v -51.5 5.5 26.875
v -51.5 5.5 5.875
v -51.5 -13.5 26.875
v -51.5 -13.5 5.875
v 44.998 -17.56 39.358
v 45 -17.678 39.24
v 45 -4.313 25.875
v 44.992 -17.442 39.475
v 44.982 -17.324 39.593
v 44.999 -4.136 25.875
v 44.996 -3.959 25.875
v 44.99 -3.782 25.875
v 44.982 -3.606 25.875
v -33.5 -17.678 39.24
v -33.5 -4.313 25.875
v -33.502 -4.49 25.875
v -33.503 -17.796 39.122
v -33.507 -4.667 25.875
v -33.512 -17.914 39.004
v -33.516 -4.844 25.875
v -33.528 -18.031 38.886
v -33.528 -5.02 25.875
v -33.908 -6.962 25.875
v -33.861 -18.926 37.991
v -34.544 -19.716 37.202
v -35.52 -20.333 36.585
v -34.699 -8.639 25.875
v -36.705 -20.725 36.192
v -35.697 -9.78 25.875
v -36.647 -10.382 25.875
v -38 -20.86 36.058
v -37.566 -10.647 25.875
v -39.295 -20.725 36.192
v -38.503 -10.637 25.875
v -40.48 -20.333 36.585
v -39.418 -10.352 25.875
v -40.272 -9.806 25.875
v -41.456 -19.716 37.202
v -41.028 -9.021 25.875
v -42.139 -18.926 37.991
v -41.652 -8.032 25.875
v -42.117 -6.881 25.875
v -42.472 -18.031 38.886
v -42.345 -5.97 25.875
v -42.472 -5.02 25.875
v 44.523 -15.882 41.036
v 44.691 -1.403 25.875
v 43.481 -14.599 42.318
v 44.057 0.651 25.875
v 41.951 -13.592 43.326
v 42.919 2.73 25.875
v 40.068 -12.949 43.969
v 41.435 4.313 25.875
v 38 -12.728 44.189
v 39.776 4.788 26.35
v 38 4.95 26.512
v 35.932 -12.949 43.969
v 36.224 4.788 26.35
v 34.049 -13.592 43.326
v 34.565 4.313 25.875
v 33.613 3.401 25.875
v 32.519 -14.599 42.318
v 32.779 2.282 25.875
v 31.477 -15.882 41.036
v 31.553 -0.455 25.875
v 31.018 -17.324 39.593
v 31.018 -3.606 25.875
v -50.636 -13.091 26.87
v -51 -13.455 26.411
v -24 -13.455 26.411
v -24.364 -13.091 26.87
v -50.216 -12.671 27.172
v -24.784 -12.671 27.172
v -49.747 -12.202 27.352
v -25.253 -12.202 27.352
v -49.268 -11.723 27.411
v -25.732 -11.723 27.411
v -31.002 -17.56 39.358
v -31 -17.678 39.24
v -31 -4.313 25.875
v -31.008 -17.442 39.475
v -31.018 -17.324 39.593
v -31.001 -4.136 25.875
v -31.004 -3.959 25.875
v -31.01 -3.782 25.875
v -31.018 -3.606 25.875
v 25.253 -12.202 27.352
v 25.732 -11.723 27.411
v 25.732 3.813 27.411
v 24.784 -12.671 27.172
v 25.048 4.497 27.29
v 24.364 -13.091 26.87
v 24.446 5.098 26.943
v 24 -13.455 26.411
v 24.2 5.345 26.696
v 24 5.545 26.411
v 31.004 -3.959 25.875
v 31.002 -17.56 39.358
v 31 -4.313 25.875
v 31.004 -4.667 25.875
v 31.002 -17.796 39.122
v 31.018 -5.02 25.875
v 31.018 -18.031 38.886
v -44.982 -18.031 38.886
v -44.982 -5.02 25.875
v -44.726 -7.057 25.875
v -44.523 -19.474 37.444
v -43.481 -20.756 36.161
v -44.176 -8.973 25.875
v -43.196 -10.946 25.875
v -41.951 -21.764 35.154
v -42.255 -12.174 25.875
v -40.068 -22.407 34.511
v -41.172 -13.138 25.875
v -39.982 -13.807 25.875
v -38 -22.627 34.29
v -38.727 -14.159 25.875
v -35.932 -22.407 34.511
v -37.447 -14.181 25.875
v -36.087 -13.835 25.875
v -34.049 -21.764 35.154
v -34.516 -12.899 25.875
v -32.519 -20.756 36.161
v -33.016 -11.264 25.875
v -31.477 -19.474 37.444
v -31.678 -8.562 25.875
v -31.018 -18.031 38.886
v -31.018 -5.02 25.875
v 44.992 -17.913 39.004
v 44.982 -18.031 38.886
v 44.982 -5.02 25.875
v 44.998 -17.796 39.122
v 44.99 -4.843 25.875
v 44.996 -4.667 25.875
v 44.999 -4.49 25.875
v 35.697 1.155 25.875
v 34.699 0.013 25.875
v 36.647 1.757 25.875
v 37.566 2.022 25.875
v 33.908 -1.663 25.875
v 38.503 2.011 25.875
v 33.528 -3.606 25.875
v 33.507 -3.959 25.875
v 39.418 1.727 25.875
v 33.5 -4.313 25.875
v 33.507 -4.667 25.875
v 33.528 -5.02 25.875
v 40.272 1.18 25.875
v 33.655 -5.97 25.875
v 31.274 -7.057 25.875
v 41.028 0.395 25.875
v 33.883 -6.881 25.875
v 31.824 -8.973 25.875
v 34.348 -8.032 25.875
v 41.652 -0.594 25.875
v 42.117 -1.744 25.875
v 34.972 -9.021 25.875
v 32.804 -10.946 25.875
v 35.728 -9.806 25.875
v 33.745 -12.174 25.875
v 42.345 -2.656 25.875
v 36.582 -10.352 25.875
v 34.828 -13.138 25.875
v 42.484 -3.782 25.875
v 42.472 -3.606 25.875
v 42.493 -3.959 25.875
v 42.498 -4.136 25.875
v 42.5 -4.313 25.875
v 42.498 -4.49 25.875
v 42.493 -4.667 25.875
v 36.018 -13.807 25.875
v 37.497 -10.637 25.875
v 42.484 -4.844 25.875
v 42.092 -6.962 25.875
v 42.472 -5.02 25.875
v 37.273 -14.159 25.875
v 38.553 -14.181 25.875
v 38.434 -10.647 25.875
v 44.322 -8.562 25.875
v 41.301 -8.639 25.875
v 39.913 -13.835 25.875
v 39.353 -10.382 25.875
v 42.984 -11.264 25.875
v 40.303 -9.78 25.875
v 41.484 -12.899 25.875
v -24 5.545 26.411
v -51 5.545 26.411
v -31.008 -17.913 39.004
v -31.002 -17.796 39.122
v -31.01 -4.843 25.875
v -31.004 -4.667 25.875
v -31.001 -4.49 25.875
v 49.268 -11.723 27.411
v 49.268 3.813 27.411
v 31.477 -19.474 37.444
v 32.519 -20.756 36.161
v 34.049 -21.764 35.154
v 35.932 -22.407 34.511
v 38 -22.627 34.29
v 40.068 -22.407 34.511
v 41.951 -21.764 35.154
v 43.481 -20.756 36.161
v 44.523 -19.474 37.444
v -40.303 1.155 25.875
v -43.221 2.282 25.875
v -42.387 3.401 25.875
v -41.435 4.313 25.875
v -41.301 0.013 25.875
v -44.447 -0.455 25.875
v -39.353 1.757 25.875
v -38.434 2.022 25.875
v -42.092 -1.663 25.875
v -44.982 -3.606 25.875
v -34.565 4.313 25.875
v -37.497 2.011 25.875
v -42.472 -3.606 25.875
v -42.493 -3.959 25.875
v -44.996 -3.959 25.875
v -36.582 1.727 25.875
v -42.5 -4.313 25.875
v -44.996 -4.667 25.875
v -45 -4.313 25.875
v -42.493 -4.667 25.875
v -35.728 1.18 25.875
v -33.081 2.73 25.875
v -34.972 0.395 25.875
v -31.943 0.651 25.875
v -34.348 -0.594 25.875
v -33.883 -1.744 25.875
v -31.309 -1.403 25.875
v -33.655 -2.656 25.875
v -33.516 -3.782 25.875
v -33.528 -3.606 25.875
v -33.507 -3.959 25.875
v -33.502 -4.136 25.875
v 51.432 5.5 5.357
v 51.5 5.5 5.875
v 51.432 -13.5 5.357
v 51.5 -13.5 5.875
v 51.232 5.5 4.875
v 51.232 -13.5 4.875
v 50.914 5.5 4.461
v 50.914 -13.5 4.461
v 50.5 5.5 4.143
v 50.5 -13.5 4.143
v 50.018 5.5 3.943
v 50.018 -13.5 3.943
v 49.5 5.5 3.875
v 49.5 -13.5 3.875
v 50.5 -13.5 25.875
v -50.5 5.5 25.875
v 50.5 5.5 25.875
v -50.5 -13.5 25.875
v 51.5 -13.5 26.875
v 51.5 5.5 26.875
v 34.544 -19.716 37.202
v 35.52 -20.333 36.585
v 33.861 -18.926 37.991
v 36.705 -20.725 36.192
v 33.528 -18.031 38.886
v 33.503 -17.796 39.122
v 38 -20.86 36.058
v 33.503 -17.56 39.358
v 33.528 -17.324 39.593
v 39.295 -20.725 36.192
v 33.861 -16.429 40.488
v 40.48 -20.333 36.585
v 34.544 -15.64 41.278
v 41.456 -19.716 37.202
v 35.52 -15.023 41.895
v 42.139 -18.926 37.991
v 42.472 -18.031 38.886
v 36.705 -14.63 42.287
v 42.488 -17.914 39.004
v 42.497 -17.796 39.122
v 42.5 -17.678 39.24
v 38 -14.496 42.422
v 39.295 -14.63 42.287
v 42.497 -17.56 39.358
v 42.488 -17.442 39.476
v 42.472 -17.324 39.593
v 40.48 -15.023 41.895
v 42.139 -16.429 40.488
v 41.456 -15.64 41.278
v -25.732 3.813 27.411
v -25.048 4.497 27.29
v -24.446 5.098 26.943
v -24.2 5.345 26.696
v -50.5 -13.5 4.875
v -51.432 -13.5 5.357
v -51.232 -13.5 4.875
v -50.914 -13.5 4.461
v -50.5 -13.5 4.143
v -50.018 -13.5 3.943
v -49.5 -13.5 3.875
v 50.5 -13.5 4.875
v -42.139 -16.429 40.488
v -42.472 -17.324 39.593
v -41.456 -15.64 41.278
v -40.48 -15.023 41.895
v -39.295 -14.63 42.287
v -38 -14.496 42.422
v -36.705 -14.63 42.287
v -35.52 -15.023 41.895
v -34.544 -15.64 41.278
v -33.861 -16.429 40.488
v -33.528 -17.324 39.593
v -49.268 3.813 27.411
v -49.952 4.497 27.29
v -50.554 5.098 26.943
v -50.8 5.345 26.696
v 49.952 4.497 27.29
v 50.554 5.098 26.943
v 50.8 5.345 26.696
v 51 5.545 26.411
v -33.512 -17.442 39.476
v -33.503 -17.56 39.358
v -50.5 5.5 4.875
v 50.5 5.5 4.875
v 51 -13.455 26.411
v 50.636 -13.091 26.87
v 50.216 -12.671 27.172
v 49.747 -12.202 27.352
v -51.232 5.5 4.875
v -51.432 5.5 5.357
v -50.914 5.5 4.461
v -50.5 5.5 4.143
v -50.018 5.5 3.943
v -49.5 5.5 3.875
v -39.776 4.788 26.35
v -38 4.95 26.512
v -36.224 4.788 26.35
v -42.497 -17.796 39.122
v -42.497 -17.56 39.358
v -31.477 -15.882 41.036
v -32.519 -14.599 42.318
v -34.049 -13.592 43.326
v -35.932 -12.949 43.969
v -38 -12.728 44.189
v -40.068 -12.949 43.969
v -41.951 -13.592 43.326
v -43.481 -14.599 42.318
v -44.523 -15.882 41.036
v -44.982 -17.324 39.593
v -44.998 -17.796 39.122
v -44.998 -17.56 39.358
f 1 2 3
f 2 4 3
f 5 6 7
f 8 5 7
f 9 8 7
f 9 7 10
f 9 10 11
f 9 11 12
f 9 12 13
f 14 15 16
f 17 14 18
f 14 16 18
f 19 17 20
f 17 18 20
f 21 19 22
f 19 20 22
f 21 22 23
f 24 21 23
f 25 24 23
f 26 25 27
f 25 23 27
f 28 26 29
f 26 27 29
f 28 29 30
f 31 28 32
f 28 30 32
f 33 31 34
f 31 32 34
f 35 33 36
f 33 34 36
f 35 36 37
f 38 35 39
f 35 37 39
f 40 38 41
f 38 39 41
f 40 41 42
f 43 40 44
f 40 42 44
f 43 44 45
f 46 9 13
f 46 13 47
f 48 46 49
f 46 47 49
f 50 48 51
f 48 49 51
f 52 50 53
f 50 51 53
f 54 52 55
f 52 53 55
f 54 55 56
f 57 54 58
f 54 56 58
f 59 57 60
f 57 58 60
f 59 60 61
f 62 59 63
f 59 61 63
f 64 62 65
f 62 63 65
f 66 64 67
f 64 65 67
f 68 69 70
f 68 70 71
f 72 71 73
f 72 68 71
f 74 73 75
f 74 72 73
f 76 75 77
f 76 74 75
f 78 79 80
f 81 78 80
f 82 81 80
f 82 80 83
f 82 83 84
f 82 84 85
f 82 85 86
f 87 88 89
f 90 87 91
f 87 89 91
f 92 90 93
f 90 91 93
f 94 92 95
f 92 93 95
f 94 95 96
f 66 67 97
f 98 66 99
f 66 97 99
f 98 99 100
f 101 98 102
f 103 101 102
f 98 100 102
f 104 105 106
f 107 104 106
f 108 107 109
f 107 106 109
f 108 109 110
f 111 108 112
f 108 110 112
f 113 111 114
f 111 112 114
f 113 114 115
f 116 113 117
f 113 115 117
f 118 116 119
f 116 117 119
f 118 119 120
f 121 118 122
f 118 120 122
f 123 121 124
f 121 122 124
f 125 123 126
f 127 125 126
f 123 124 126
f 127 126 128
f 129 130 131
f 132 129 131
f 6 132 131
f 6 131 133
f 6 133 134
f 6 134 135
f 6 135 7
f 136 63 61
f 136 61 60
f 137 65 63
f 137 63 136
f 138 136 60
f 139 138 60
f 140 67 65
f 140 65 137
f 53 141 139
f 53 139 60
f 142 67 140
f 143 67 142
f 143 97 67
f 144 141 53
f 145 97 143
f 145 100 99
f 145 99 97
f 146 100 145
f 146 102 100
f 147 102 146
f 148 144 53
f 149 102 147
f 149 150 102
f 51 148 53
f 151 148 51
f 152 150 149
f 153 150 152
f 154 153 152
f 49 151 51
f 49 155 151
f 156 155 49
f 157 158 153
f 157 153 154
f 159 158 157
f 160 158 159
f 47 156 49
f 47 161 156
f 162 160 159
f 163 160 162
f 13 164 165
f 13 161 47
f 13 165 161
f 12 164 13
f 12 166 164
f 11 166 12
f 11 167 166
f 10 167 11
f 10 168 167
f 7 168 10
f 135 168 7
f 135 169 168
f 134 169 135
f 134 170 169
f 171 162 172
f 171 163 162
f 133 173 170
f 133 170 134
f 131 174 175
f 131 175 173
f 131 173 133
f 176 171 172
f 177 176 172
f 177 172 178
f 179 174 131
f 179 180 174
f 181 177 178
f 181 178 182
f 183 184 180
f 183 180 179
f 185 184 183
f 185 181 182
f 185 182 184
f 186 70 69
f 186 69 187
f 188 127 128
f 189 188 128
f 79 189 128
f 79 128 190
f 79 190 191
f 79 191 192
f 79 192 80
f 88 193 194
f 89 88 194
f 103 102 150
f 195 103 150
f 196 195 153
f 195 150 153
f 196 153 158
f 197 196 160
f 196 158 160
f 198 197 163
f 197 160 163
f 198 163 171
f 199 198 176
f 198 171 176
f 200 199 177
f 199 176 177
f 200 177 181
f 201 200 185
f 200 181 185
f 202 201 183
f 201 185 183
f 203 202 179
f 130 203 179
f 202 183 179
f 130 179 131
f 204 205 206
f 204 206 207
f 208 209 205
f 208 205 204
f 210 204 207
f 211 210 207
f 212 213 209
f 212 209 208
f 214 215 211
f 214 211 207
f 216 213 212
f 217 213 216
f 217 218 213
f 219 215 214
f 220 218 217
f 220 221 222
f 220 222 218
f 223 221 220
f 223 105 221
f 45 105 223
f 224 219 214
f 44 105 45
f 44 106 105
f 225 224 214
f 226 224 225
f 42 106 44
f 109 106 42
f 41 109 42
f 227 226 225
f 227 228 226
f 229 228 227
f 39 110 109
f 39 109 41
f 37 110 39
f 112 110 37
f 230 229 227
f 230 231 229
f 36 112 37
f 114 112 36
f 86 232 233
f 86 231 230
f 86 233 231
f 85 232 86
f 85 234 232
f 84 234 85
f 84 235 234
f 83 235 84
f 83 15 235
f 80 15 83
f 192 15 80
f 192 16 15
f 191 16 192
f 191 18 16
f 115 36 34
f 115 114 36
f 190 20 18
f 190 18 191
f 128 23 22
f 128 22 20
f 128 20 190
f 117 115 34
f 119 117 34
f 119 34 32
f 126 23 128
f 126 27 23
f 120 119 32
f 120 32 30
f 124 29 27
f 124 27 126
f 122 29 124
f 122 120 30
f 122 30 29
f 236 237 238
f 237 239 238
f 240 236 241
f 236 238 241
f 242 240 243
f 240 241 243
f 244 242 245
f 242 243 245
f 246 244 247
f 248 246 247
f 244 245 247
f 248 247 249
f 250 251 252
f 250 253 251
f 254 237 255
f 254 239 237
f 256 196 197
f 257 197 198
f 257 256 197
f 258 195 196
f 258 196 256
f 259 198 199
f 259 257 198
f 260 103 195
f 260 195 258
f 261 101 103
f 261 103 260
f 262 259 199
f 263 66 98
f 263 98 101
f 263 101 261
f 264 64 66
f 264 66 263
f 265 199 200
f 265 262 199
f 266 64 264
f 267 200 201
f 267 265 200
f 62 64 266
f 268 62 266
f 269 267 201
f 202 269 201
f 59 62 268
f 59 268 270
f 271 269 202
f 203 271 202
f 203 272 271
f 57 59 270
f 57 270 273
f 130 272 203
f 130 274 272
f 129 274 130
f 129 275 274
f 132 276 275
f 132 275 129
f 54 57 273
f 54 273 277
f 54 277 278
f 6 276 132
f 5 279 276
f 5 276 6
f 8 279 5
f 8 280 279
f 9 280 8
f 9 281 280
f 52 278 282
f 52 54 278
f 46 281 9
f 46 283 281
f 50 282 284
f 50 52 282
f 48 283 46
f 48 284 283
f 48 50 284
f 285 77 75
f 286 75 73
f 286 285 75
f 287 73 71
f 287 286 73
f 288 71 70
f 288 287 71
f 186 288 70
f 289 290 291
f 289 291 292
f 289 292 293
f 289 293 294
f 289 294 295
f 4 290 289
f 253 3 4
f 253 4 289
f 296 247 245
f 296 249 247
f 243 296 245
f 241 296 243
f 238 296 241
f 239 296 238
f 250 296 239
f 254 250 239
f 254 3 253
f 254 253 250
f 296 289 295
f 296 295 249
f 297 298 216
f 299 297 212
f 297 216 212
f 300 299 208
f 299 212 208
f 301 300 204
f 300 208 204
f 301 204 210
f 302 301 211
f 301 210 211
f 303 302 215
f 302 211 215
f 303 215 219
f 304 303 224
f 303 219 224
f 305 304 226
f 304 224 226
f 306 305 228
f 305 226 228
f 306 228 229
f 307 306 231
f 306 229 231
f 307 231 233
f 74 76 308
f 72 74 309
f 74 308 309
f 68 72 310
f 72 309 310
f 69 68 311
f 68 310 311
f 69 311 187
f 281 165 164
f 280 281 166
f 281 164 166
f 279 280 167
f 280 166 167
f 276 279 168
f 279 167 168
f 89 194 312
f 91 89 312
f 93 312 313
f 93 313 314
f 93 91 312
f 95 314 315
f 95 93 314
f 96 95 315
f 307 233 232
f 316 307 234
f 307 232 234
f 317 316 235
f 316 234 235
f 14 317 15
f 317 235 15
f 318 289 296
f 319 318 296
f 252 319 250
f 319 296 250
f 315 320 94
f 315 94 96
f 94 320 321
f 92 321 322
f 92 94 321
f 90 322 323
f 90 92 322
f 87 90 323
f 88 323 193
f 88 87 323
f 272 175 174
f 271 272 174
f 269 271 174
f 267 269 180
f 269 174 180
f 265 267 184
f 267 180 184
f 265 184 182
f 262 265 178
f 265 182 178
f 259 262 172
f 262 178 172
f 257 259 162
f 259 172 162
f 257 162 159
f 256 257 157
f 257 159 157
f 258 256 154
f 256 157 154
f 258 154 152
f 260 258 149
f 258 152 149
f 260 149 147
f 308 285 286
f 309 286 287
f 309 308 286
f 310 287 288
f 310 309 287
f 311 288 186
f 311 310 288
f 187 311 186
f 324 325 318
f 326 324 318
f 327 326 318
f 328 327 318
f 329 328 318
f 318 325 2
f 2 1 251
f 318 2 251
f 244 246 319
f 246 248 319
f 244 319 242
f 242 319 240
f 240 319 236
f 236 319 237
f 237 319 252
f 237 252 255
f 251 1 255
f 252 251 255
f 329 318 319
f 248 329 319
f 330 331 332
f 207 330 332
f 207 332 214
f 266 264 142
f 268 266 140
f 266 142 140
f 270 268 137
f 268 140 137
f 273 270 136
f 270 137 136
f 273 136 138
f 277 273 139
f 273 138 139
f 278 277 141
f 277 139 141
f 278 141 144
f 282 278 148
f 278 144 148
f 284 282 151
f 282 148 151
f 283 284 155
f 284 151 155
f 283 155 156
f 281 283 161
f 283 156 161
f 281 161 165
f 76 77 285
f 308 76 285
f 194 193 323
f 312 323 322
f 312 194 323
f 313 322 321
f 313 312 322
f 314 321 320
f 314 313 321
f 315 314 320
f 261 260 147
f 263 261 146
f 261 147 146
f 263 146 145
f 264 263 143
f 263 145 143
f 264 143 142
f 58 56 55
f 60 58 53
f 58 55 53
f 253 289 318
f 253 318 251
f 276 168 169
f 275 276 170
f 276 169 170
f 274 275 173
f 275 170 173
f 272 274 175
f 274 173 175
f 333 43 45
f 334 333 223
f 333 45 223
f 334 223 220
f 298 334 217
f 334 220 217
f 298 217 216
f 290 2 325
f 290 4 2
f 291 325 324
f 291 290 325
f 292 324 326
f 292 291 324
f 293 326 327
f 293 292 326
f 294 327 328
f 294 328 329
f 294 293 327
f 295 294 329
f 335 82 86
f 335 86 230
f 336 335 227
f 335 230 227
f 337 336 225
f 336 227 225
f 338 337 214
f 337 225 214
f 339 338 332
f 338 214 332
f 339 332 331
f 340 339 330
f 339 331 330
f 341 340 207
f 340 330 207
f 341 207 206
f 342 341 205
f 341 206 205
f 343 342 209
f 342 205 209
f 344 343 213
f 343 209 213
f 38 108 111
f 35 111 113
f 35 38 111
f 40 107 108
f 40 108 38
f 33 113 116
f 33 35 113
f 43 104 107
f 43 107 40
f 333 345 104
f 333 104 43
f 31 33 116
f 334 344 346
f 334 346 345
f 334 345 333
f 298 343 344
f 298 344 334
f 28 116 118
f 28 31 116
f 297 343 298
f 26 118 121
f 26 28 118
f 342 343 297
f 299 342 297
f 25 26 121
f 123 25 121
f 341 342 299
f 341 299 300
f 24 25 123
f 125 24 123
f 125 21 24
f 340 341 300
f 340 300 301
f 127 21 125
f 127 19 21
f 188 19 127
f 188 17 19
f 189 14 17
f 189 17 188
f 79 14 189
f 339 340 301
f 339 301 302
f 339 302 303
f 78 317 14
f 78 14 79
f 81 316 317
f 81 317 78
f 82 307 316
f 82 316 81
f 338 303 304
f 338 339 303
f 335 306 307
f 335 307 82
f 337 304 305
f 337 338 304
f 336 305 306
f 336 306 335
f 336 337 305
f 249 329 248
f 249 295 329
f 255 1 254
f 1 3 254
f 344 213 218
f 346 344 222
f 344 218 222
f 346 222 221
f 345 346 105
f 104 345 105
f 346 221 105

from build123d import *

# Parameters (mm, degrees)
F1_DEPTH       = 25
F2_ANGLE       = 45
F3_W           = 19
F3_H           = 1
F4_DEPTH       = 51
F4_DEPTH_BACK  = 51
F5_DEPTH       = 24
F5_DEPTH_BACK  = 24
F6_W           = 103
F6_H           = 23
F6_W_2         = 101
F6_H_2         = 21
F7_DEPTH       = 13.5
F7_DEPTH_BACK  = 5.5
F8_DEPTH       = 25
F8_DEPTH_BACK  = 25
F9_T1_DEPTH    = 35.6602540378
F9_T3_DEPTH    = 27.6602540378
F9_S1_T1_DEPTH = 35.6602540378
F9_S1_T3_DEPTH = 27.6602540378
F10_R          = 2


# Not quite as in the source:
# - a fillet or chamfer that OpenCascade refuses, or shapes differently, is made with other operations: its cross-section is extruded or revolved along the edge and cut away or added


with BuildPart() as f1:
    # F0 (on Front) → F1 (new body)
    with BuildSketch(Plane.XZ):
        with BuildLine():
            Line((-33.527864045, 22.0619773716), (-31.0178799781, 22.0619773716))
            ThreePointArc((-31.0178799781, 22.0619773716), (-38, 28.5619773716), (-44.9821200219, 22.0619773716))
            Line((-44.9821200219, 22.0619773716), (-42.472135955, 22.0619773716))
            ThreePointArc((-42.472135955, 22.0619773716), (-38, 26.0619773716), (-33.527864045, 22.0619773716))
        make_face()
        with BuildLine():
            Line((-42.472135955, 22.0619773716), (-44.9821200219, 22.0619773716))
            ThreePointArc((-44.9821200219, 22.0619773716), (-45, 21.5619773716), (-44.9821200219, 21.0619773716))
            Line((-44.9821200219, 21.0619773716), (-42.472135955, 21.0619773716))
            ThreePointArc((-42.472135955, 21.0619773716), (-42.5, 21.5619773716), (-42.472135955, 22.0619773716))
        make_face()
        with BuildLine():
            ThreePointArc((-44.9821200219, 21.0619773716), (-38, 14.5619773716), (-31.0178799781, 21.0619773716))
            Line((-31.0178799781, 21.0619773716), (-33.527864045, 21.0619773716))
            ThreePointArc((-33.527864045, 21.0619773716), (-38, 17.0619773716), (-42.472135955, 21.0619773716))
            Line((-42.472135955, 21.0619773716), (-44.9821200219, 21.0619773716))
        make_face()
        with BuildLine():
            ThreePointArc((-31.0178799781, 21.0619773716), (-31.0044714226, 21.3118175758), (-31, 21.5619773716))
            ThreePointArc((-31, 21.5619773716), (-31.0044714226, 21.8121371673), (-31.0178799781, 22.0619773716))
            Line((-31.0178799781, 22.0619773716), (-33.527864045, 22.0619773716))
            ThreePointArc((-33.527864045, 22.0619773716), (-33.5069714113, 21.8123652731), (-33.5, 21.5619773716))
            ThreePointArc((-33.5, 21.5619773716), (-33.5069714113, 21.31158947), (-33.527864045, 21.0619773716))
            Line((-33.527864045, 21.0619773716), (-31.0178799781, 21.0619773716))
        make_face()
    extrude(amount=F1_DEPTH)


with BuildPart() as f1b:
    # F0 (on Front) → F1, piece 2 (new body)
    with BuildSketch(Plane.XZ):
        with BuildLine():
            ThreePointArc((44.9821200219, 22.0619773716), (38, 28.5619773716), (31.0178799781, 22.0619773716))
            Line((31.0178799781, 22.0619773716), (33.527864045, 22.0619773716))
            ThreePointArc((33.527864045, 22.0619773716), (38, 26.0619773716), (42.472135955, 22.0619773716))
            Line((42.472135955, 22.0619773716), (44.9821200219, 22.0619773716))
        make_face()
        with BuildLine():
            Line((33.527864045, 22.0619773716), (31.0178799781, 22.0619773716))
            ThreePointArc((31.0178799781, 22.0619773716), (31, 21.5619773716), (31.0178799781, 21.0619773716))
            Line((31.0178799781, 21.0619773716), (33.527864045, 21.0619773716))
            ThreePointArc((33.527864045, 21.0619773716), (33.5, 21.5619773716), (33.527864045, 22.0619773716))
        make_face()
        with BuildLine():
            Line((33.527864045, 21.0619773716), (31.0178799781, 21.0619773716))
            ThreePointArc((31.0178799781, 21.0619773716), (38, 14.5619773716), (44.9821200219, 21.0619773716))
            Line((44.9821200219, 21.0619773716), (42.472135955, 21.0619773716))
            ThreePointArc((42.472135955, 21.0619773716), (38, 17.0619773716), (33.527864045, 21.0619773716))
        make_face()
        with BuildLine():
            ThreePointArc((45, 21.5619773716), (44.9955285774, 21.8121371673), (44.9821200219, 22.0619773716))
            Line((44.9821200219, 22.0619773716), (42.472135955, 22.0619773716))
            ThreePointArc((42.472135955, 22.0619773716), (42.4930285887, 21.8123652731), (42.5, 21.5619773716))
            ThreePointArc((42.5, 21.5619773716), (42.4930285887, 21.31158947), (42.472135955, 21.0619773716))
            Line((42.472135955, 21.0619773716), (44.9821200219, 21.0619773716))
            ThreePointArc((44.9821200219, 21.0619773716), (44.9955285774, 21.3118175758), (45, 21.5619773716))
        make_face()
    extrude(amount=F1_DEPTH)


with BuildPart() as f1_1:
    # F2: moved
    add(f1.part.rotate(Axis((25, 0, 21.5619773716), (-1, 0, 0)), F2_ANGLE))


with BuildPart() as f1b_1:
    # F2: moved
    add(f1b.part.rotate(Axis((25, 0, 21.5619773716), (-1, 0, 0)), F2_ANGLE))


with BuildPart() as f4:
    # F3 (on Right) → F4 (new body, two sides)
    with BuildSketch(Plane.YZ) as f4_sk:
        with Locations((-3.955035704, 26.910741644)):
            Rectangle(F3_W, F3_H)
    extrude(amount=F4_DEPTH)
    extrude(f4_sk.sketch, amount=-F4_DEPTH_BACK)

    # F3 (on Right) → F5 (cut, two sides)
    with BuildSketch(Plane.YZ) as f5_sk:
        with Locations((-3.955035704, 26.910741644)):
            Rectangle(F3_W, F3_H)
    extrude(amount=-F5_DEPTH, mode=Mode.SUBTRACT)
    extrude(f5_sk.sketch, amount=F5_DEPTH_BACK, mode=Mode.SUBTRACT)

    # F9: fillet of radius 2 on 4 edges, made by hand

    # F9_s2 → F9_t1 (cut)
    with BuildSketch(Plane.YZ.offset(19.6698729811)):
        with BuildLine():
            ThreePointArc((3.8129134884, 27.410741644), (4.8129134884, 27.1427924515), (5.544964296, 26.410741644))
            Line((5.544964296, 26.410741644), (5.544964296, 27.410741644))
            Line((5.544964296, 27.410741644), (3.8129134884, 27.410741644))
        make_face()
        with BuildLine():
            ThreePointArc((-13.455035704, 26.410741644), (-12.7229848965, 27.1427924515), (-11.7229848965, 27.410741644))
            Line((-11.7229848965, 27.410741644), (-13.455035704, 27.410741644))
            Line((-13.455035704, 27.410741644), (-13.455035704, 26.410741644))
        make_face()
    extrude(amount=F9_T1_DEPTH, mode=Mode.SUBTRACT)

    # F9_s4 → F9_t3 (cut)
    with BuildSketch(Plane.XZ.offset(-9.8750913149)):
        with BuildLine():
            ThreePointArc((25.7320508076, 27.410741644), (24.7320508076, 27.1427924515), (24, 26.410741644))
            Line((24, 26.410741644), (24, 27.410741644))
            Line((24, 27.410741644), (25.7320508076, 27.410741644))
        make_face()
        with BuildLine():
            ThreePointArc((49.2679491924, 27.410741644), (50.2679491924, 27.1427924515), (51, 26.410741644))
            Line((51, 26.410741644), (51, 27.410741644))
            Line((51, 27.410741644), (49.2679491924, 27.410741644))
        make_face()
    extrude(amount=F9_T3_DEPTH, mode=Mode.SUBTRACT)

    # F9#s1: fillet of radius 2 on 4 edges, made by hand

    # F9_s1_s2 → F9_s1_t1 (cut)
    with BuildSketch(Plane.YZ.offset(-55.3301270189)):
        with BuildLine():
            ThreePointArc((3.8129134884, 27.410741644), (4.8129134884, 27.1427924515), (5.544964296, 26.410741644))
            Line((5.544964296, 26.410741644), (5.5796053121, 26.430741644))
            ThreePointArc((5.5796053121, 26.430741644), (5.584964296, 26.910741644), (5.584964296, 27.410741644))
            Line((5.584964296, 27.410741644), (5.544964296, 27.450741644))
            Line((5.544964296, 27.450741644), (3.8129134884, 27.450741644))
            Line((3.8129134884, 27.450741644), (3.8129134884, 27.410741644))
        make_face()
        with BuildLine():
            ThreePointArc((-13.455035704, 26.410741644), (-12.7229848965, 27.1427924515), (-11.7229848965, 27.410741644))
            Line((-11.7229848965, 27.410741644), (-11.7229848965, 27.450741644))
            Line((-11.7229848965, 27.450741644), (-13.455035704, 27.450741644))
            Line((-13.455035704, 27.450741644), (-13.495035704, 27.410741644))
            ThreePointArc((-13.495035704, 27.410741644), (-13.495035704, 26.910741644), (-13.4896767202, 26.430741644))
            Line((-13.4896767202, 26.430741644), (-13.455035704, 26.410741644))
        make_face()
    extrude(amount=F9_S1_T1_DEPTH, mode=Mode.SUBTRACT)

    # F9_s1_s4 → F9_s1_t3 (cut)
    with BuildSketch(Plane.XZ.offset(-9.8750913149)):
        with BuildLine():
            ThreePointArc((-49.2679491924, 27.410741644), (-50.2679491924, 27.1427924515), (-51, 26.410741644))
            Line((-51, 26.410741644), (-51.0346410162, 26.430741644))
            ThreePointArc((-51.0346410162, 26.430741644), (-51.04, 26.910741644), (-51.04, 27.410741644))
            Line((-51.04, 27.410741644), (-51, 27.450741644))
            Line((-51, 27.450741644), (-49.2679491924, 27.450741644))
            Line((-49.2679491924, 27.450741644), (-49.2679491924, 27.410741644))
        make_face()
        with BuildLine():
            ThreePointArc((-25.7320508076, 27.410741644), (-24.7320508076, 27.1427924515), (-24, 26.410741644))
            Line((-24, 26.410741644), (-23.9653589838, 26.430741644))
            ThreePointArc((-23.9653589838, 26.430741644), (-23.96, 26.910741644), (-23.96, 27.410741644))
            Line((-23.96, 27.410741644), (-24, 27.450741644))
            Line((-24, 27.450741644), (-25.7320508076, 27.450741644))
            Line((-25.7320508076, 27.450741644), (-25.7320508076, 27.410741644))
        make_face()
    extrude(amount=F9_S1_T3_DEPTH, mode=Mode.SUBTRACT)


with BuildPart() as f7:
    # F6 (on Front) → F7 (new body, two sides)
    with BuildSketch(Plane.XZ) as f7_sk:
        with Locations((0, 15.3747174848)):
            Rectangle(F6_W, F6_H)
        with Locations((0, 15.3747174848)):
            Rectangle(F6_W_2, F6_H_2, mode=Mode.SUBTRACT)
    extrude(amount=F7_DEPTH)
    extrude(f7_sk.sketch, amount=-F7_DEPTH_BACK)

    # F10
    f10_edges = [f7.edges().sort_by_distance(p)[0] for p in [
        (51.5, -4, 3.874717),
        (-51.5, -4, 3.874717),
    ]]
    fillet(f10_edges, radius=F10_R)


with BuildPart() as f8_tool:
    # F6 (on Front) → F8 (new body, two sides)
    with BuildSketch(Plane.XZ) as f8_sk:
        with Locations((0, 15.3747174848)):
            Rectangle(F6_W_2, F6_H_2)
    extrude(amount=F8_DEPTH)
    extrude(f8_sk.sketch, amount=-F8_DEPTH_BACK)


with BuildPart() as f1_2:
    add(f1_1.part)

    # F8: cut by f8_tool
    add(f8_tool.part, mode=Mode.SUBTRACT)


with BuildPart() as f1b_2:
    add(f1b_1.part)

    # F8: cut by f8_tool
    add(f8_tool.part, mode=Mode.SUBTRACT)


solid = Compound([f4.part, f7.part, f1_2.part, f1b_2.part])
